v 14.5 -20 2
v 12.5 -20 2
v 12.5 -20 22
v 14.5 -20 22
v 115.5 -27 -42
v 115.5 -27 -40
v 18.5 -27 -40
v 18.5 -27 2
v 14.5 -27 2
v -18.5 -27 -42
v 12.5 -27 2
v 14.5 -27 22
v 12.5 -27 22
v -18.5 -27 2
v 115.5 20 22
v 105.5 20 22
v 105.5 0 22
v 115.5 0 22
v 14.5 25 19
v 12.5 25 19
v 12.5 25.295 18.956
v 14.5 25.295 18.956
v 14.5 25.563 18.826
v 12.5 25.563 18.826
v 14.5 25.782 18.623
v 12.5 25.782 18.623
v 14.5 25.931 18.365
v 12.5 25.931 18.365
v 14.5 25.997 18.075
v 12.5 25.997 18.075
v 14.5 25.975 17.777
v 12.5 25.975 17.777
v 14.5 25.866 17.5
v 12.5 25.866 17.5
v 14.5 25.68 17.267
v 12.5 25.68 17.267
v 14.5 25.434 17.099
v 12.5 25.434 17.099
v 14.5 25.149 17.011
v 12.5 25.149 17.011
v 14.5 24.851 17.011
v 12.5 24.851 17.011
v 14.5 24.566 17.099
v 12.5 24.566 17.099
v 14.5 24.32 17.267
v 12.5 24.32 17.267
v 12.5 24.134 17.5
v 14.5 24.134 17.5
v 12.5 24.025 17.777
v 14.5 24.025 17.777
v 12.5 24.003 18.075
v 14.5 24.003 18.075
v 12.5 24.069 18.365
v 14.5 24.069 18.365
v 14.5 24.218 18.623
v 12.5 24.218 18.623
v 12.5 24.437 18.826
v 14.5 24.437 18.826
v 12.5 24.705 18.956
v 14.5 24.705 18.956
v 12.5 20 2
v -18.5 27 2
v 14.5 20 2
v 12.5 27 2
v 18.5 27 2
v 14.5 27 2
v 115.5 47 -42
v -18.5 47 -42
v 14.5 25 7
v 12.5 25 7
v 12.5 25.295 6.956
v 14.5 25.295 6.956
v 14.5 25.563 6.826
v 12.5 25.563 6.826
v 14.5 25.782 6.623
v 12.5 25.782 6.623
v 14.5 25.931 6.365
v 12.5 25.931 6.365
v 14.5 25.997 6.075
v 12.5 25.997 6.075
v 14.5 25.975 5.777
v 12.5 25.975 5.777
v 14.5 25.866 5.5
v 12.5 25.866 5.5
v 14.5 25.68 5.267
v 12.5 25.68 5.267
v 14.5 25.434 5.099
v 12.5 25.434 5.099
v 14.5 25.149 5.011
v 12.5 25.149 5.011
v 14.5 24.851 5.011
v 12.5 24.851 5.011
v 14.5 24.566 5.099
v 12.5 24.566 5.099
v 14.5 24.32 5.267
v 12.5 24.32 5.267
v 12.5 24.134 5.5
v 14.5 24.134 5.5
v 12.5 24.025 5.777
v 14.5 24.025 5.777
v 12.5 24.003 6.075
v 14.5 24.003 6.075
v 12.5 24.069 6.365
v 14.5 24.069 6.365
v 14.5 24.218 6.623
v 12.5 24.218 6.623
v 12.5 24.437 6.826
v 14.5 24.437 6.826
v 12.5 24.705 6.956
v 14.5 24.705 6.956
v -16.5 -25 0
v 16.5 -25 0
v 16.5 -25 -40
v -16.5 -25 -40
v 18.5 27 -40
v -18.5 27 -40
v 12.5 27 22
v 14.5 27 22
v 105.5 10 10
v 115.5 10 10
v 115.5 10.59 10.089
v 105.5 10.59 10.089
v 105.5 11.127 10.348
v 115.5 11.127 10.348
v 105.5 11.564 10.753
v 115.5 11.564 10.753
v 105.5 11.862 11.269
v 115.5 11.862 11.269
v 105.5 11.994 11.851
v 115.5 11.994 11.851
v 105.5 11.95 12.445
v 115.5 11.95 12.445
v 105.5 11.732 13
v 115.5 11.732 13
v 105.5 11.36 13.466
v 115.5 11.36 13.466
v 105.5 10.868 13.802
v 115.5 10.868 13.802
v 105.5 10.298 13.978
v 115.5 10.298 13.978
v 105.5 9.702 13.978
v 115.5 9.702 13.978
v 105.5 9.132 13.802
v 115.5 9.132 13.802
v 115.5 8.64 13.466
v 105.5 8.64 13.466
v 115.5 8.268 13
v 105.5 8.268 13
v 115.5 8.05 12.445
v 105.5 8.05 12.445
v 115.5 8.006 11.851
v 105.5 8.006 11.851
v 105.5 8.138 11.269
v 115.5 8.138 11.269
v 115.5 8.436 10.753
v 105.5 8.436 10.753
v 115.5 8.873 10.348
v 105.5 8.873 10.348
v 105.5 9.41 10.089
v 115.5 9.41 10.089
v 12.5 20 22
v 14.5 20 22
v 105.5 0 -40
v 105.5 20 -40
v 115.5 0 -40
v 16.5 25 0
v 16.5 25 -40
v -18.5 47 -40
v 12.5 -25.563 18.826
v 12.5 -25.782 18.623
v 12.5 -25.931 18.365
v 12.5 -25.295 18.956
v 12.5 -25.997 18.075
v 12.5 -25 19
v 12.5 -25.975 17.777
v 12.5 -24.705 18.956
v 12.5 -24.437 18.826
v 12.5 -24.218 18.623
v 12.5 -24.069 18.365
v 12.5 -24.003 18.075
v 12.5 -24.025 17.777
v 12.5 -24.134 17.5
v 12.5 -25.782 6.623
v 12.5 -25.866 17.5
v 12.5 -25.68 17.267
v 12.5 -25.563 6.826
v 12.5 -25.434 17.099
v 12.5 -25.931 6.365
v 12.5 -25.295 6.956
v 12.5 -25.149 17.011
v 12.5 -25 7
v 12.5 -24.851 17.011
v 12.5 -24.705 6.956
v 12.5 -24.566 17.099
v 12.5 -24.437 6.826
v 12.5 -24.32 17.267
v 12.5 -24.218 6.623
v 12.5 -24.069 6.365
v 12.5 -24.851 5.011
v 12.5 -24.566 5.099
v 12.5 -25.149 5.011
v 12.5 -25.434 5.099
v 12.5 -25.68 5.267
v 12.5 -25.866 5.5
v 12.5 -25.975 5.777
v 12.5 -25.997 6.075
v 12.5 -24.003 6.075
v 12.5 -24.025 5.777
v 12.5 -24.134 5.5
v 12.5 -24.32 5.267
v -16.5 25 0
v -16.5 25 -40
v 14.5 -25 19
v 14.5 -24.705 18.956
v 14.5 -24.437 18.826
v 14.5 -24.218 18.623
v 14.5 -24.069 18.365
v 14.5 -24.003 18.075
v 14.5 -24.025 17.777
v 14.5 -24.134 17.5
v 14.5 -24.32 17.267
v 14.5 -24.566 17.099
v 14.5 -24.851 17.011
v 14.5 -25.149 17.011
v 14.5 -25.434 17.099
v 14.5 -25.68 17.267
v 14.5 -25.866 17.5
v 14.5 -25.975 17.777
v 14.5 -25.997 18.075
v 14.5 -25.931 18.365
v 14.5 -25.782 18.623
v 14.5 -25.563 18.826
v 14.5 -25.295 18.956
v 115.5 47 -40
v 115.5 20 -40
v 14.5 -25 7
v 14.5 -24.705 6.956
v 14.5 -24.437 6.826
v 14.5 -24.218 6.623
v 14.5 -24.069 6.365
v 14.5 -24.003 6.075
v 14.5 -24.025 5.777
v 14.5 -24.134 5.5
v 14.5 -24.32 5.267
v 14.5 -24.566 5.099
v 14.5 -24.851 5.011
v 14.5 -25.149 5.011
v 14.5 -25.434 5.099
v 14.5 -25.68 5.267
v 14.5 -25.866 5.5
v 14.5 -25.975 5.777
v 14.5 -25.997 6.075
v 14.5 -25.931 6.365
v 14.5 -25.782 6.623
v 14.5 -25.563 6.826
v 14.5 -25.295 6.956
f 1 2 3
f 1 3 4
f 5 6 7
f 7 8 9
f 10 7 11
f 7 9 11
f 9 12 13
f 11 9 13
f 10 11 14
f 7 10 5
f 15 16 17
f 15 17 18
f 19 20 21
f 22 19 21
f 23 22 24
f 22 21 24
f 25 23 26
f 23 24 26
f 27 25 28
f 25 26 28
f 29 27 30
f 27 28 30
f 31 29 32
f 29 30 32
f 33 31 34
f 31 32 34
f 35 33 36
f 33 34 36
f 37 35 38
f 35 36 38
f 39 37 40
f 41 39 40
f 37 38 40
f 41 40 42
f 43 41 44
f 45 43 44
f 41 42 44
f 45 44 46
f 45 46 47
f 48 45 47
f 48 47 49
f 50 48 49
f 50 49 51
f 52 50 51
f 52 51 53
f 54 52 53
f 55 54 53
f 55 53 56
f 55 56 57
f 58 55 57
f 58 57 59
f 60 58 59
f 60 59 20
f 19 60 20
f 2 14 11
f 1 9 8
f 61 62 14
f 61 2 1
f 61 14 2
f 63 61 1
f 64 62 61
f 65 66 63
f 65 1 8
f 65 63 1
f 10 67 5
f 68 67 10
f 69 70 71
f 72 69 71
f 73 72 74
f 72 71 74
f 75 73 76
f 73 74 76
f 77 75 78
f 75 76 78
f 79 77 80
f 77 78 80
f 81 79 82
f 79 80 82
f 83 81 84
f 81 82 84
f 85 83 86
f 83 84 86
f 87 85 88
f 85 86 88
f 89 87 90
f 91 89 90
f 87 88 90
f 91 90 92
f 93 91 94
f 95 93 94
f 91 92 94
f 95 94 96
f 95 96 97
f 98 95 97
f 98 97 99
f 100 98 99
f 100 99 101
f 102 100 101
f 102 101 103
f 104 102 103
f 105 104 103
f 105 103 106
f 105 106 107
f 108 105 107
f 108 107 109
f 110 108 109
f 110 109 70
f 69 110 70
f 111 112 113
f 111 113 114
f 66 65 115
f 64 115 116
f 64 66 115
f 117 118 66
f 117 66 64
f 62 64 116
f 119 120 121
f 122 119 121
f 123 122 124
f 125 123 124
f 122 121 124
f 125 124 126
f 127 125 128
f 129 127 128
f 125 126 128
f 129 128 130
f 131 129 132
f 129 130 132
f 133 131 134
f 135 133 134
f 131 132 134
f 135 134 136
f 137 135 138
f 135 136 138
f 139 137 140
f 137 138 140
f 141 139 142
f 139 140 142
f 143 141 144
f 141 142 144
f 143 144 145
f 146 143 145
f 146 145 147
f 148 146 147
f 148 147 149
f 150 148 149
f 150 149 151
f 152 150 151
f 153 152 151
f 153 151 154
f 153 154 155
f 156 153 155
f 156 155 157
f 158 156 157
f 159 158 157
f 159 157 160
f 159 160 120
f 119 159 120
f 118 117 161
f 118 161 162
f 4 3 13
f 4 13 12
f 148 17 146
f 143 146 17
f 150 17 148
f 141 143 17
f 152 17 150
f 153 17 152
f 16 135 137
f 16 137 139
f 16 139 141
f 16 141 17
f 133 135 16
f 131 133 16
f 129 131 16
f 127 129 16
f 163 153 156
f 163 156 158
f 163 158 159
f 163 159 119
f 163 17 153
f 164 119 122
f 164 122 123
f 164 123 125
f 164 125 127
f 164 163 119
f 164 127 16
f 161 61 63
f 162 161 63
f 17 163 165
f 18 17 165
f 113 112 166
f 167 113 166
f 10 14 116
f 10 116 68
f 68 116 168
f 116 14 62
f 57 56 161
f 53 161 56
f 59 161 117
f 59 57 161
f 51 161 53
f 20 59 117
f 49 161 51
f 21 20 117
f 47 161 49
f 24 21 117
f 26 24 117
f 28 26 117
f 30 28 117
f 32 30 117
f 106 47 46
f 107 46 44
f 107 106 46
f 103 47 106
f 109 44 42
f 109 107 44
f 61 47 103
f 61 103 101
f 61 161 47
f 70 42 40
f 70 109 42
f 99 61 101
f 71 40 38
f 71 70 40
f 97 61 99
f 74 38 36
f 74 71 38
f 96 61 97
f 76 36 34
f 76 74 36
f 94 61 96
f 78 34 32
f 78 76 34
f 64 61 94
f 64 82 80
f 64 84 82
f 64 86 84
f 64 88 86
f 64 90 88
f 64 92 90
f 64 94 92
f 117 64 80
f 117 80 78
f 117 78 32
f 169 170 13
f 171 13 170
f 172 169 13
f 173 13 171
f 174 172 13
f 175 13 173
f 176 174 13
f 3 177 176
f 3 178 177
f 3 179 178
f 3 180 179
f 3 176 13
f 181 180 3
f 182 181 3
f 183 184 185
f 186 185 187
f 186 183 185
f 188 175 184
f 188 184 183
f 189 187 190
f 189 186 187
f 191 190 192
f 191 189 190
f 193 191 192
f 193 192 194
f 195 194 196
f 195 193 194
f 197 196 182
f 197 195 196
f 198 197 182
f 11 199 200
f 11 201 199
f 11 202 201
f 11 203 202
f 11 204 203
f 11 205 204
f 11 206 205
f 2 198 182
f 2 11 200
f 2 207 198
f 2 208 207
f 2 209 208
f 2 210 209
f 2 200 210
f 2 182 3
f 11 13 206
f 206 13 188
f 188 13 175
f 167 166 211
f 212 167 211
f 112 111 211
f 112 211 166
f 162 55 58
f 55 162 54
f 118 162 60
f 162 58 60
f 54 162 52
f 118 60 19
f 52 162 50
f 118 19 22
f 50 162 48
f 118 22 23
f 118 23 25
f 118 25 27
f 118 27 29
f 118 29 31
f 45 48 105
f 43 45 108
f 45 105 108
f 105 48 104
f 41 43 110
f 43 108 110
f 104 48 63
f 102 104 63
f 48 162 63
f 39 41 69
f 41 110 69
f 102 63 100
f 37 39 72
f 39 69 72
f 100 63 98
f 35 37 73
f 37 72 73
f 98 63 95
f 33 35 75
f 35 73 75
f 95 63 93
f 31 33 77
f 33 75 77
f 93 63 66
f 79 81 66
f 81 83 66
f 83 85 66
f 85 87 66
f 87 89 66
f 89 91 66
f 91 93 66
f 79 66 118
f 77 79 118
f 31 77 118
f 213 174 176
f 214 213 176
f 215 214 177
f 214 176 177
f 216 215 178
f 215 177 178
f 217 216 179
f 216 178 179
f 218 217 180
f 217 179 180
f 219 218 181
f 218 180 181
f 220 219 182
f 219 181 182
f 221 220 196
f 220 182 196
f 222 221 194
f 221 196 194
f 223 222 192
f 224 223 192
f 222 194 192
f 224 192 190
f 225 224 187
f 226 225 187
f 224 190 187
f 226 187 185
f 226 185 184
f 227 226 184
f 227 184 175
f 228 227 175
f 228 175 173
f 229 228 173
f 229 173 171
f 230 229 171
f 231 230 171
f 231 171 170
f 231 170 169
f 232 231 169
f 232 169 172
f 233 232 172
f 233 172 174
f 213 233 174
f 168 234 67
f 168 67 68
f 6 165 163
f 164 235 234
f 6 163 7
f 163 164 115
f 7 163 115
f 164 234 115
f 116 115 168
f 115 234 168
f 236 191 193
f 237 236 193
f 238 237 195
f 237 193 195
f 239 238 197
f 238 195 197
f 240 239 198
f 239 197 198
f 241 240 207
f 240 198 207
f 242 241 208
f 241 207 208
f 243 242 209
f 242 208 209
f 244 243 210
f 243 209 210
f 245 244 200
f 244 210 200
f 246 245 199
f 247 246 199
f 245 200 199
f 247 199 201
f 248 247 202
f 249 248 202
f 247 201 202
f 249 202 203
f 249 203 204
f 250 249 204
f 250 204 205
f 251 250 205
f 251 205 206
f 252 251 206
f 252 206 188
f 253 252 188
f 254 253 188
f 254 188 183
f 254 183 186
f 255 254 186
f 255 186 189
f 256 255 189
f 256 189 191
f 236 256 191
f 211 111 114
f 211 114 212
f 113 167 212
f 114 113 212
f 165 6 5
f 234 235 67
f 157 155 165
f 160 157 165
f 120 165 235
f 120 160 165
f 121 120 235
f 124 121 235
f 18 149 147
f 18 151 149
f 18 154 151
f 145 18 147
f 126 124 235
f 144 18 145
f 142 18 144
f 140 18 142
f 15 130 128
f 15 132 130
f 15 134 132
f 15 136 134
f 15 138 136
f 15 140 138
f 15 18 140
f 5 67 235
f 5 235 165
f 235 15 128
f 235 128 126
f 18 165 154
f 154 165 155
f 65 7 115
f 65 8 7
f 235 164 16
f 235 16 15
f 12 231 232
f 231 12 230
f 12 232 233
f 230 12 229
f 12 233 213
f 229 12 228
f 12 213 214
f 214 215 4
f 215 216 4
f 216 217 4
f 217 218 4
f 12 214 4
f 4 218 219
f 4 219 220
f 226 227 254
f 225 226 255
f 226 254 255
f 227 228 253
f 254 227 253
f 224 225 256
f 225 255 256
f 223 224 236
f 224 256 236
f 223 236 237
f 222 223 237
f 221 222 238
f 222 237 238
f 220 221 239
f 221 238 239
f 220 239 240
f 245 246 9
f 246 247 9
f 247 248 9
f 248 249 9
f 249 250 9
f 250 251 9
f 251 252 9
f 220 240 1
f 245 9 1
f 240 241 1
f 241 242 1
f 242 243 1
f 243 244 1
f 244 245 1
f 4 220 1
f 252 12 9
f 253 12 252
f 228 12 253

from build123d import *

# Parameters (mm, degrees)
SKETCH1_W           = 37
SKETCH1_H           = 54
BOSS_EXTRUDE1_DEPTH = 2
SKETCH2_W           = 2
SKETCH2_H           = 7
BOSS_EXTRUDE2_DEPTH = 20
CUT_EXTRUDE1_REACH  = 48.626
SKETCH3_R           = 1
SKETCH11_W          = 37
SKETCH11_H          = 54
SKETCH11_W_2        = 33
SKETCH11_H_2        = 50
BOSS_EXTRUDE5_DEPTH = 40
SKETCH12_W          = 134
SKETCH12_H          = 74
BOSS_EXTRUDE6_DEPTH = 2
SKETCH13_W          = 10
SKETCH13_H          = 20
BOSS_EXTRUDE7_DEPTH = 62
CUT_EXTRUDE2_REACH  = 150.084
SKETCH16_R          = 2


with BuildPart() as part:
    # Sketch1 → Boss-Extrude1 (new body)
    with BuildSketch(Plane.XY):
        Rectangle(SKETCH1_W, SKETCH1_H)
    extrude(amount=BOSS_EXTRUDE1_DEPTH)

    # Sketch2 → Boss-Extrude2 (add)
    with BuildSketch(Plane.XY.offset(2)):
        with Locations((13.5, -23.5)):
            Rectangle(SKETCH2_W, SKETCH2_H)
        with Locations((13.5, 23.5)):
            Rectangle(SKETCH2_W, SKETCH2_H)
    extrude(amount=BOSS_EXTRUDE2_DEPTH)

    # Sketch3 → Cut-Extrude1 (cut, up to next)
    with BuildSketch(Plane.ZY.offset(-12.5), mode=Mode.PRIVATE) as cut_extrude1_sk1:
        with Locations((6, -25)):
            Circle(SKETCH3_R)
    cut_extrude1_tool1 = extrude(cut_extrude1_sk1.sketch, amount=-CUT_EXTRUDE1_REACH, mode=Mode.PRIVATE) & part.part
    # Sketch3 → Cut-Extrude1 (cut, up to next)
    with BuildSketch(Plane.ZY.offset(-12.5), mode=Mode.PRIVATE) as cut_extrude1_sk2:
        with Locations((18, -25)):
            Circle(SKETCH3_R)
    cut_extrude1_tool2 = extrude(cut_extrude1_sk2.sketch, amount=-CUT_EXTRUDE1_REACH, mode=Mode.PRIVATE) & part.part
    # Sketch3 → Cut-Extrude1 (cut, up to next)
    with BuildSketch(Plane.ZY.offset(-12.5), mode=Mode.PRIVATE) as cut_extrude1_sk3:
        with Locations((6, 25)):
            Circle(SKETCH3_R)
    cut_extrude1_tool3 = extrude(cut_extrude1_sk3.sketch, amount=-CUT_EXTRUDE1_REACH, mode=Mode.PRIVATE) & part.part
    # Sketch3 → Cut-Extrude1 (cut, up to next)
    with BuildSketch(Plane.ZY.offset(-12.5), mode=Mode.PRIVATE) as cut_extrude1_sk4:
        with Locations((18, 25)):
            Circle(SKETCH3_R)
    cut_extrude1_tool4 = extrude(cut_extrude1_sk4.sketch, amount=-CUT_EXTRUDE1_REACH, mode=Mode.PRIVATE) & part.part
    add(cut_extrude1_tool1.solids().sort_by_distance((12.5, -25, 6))[0], mode=Mode.SUBTRACT)
    add(cut_extrude1_tool2.solids().sort_by_distance((12.5, -25, 18))[0], mode=Mode.SUBTRACT)
    add(cut_extrude1_tool3.solids().sort_by_distance((12.5, 25, 6))[0], mode=Mode.SUBTRACT)
    add(cut_extrude1_tool4.solids().sort_by_distance((12.5, 25, 18))[0], mode=Mode.SUBTRACT)

    # Sketch11 → Boss-Extrude5 (add)
    with BuildSketch(Plane(origin=(0, 0, 0), x_dir=(-1, 0, 0), z_dir=(0, 0, -1))):
        Rectangle(SKETCH11_W, SKETCH11_H)
        Rectangle(SKETCH11_W_2, SKETCH11_H_2, mode=Mode.SUBTRACT)
    extrude(amount=BOSS_EXTRUDE5_DEPTH)

    # Sketch12 → Boss-Extrude6 (add)
    with BuildSketch(Plane(origin=(0, 0, -40), x_dir=(-1, 0, 0), z_dir=(0, 0, -1))):
        with Locations((-48.5, 10)):
            Rectangle(SKETCH12_W, SKETCH12_H)
    extrude(amount=BOSS_EXTRUDE6_DEPTH)

    # Sketch13 → Boss-Extrude7 (add)
    with BuildSketch(Plane.XY.offset(-40)):
        with Locations((110.5, 10)):
            Rectangle(SKETCH13_W, SKETCH13_H)
    extrude(amount=BOSS_EXTRUDE7_DEPTH)

    # Sketch16 → Cut-Extrude2 (cut, up to next)
    with BuildSketch(Plane(origin=(115.5, 0, 0), x_dir=(0, 0, -1), z_dir=(1, 0, 0)), mode=Mode.PRIVATE) as cut_extrude2_sk1:
        with Locations((-12, 10)):
            Circle(SKETCH16_R)
    cut_extrude2_tool1 = extrude(cut_extrude2_sk1.sketch, amount=-CUT_EXTRUDE2_REACH, mode=Mode.PRIVATE) & part.part
    add(cut_extrude2_tool1.solids().sort_by_distance((115.5, 10, 12))[0], mode=Mode.SUBTRACT)


solid = part.part
